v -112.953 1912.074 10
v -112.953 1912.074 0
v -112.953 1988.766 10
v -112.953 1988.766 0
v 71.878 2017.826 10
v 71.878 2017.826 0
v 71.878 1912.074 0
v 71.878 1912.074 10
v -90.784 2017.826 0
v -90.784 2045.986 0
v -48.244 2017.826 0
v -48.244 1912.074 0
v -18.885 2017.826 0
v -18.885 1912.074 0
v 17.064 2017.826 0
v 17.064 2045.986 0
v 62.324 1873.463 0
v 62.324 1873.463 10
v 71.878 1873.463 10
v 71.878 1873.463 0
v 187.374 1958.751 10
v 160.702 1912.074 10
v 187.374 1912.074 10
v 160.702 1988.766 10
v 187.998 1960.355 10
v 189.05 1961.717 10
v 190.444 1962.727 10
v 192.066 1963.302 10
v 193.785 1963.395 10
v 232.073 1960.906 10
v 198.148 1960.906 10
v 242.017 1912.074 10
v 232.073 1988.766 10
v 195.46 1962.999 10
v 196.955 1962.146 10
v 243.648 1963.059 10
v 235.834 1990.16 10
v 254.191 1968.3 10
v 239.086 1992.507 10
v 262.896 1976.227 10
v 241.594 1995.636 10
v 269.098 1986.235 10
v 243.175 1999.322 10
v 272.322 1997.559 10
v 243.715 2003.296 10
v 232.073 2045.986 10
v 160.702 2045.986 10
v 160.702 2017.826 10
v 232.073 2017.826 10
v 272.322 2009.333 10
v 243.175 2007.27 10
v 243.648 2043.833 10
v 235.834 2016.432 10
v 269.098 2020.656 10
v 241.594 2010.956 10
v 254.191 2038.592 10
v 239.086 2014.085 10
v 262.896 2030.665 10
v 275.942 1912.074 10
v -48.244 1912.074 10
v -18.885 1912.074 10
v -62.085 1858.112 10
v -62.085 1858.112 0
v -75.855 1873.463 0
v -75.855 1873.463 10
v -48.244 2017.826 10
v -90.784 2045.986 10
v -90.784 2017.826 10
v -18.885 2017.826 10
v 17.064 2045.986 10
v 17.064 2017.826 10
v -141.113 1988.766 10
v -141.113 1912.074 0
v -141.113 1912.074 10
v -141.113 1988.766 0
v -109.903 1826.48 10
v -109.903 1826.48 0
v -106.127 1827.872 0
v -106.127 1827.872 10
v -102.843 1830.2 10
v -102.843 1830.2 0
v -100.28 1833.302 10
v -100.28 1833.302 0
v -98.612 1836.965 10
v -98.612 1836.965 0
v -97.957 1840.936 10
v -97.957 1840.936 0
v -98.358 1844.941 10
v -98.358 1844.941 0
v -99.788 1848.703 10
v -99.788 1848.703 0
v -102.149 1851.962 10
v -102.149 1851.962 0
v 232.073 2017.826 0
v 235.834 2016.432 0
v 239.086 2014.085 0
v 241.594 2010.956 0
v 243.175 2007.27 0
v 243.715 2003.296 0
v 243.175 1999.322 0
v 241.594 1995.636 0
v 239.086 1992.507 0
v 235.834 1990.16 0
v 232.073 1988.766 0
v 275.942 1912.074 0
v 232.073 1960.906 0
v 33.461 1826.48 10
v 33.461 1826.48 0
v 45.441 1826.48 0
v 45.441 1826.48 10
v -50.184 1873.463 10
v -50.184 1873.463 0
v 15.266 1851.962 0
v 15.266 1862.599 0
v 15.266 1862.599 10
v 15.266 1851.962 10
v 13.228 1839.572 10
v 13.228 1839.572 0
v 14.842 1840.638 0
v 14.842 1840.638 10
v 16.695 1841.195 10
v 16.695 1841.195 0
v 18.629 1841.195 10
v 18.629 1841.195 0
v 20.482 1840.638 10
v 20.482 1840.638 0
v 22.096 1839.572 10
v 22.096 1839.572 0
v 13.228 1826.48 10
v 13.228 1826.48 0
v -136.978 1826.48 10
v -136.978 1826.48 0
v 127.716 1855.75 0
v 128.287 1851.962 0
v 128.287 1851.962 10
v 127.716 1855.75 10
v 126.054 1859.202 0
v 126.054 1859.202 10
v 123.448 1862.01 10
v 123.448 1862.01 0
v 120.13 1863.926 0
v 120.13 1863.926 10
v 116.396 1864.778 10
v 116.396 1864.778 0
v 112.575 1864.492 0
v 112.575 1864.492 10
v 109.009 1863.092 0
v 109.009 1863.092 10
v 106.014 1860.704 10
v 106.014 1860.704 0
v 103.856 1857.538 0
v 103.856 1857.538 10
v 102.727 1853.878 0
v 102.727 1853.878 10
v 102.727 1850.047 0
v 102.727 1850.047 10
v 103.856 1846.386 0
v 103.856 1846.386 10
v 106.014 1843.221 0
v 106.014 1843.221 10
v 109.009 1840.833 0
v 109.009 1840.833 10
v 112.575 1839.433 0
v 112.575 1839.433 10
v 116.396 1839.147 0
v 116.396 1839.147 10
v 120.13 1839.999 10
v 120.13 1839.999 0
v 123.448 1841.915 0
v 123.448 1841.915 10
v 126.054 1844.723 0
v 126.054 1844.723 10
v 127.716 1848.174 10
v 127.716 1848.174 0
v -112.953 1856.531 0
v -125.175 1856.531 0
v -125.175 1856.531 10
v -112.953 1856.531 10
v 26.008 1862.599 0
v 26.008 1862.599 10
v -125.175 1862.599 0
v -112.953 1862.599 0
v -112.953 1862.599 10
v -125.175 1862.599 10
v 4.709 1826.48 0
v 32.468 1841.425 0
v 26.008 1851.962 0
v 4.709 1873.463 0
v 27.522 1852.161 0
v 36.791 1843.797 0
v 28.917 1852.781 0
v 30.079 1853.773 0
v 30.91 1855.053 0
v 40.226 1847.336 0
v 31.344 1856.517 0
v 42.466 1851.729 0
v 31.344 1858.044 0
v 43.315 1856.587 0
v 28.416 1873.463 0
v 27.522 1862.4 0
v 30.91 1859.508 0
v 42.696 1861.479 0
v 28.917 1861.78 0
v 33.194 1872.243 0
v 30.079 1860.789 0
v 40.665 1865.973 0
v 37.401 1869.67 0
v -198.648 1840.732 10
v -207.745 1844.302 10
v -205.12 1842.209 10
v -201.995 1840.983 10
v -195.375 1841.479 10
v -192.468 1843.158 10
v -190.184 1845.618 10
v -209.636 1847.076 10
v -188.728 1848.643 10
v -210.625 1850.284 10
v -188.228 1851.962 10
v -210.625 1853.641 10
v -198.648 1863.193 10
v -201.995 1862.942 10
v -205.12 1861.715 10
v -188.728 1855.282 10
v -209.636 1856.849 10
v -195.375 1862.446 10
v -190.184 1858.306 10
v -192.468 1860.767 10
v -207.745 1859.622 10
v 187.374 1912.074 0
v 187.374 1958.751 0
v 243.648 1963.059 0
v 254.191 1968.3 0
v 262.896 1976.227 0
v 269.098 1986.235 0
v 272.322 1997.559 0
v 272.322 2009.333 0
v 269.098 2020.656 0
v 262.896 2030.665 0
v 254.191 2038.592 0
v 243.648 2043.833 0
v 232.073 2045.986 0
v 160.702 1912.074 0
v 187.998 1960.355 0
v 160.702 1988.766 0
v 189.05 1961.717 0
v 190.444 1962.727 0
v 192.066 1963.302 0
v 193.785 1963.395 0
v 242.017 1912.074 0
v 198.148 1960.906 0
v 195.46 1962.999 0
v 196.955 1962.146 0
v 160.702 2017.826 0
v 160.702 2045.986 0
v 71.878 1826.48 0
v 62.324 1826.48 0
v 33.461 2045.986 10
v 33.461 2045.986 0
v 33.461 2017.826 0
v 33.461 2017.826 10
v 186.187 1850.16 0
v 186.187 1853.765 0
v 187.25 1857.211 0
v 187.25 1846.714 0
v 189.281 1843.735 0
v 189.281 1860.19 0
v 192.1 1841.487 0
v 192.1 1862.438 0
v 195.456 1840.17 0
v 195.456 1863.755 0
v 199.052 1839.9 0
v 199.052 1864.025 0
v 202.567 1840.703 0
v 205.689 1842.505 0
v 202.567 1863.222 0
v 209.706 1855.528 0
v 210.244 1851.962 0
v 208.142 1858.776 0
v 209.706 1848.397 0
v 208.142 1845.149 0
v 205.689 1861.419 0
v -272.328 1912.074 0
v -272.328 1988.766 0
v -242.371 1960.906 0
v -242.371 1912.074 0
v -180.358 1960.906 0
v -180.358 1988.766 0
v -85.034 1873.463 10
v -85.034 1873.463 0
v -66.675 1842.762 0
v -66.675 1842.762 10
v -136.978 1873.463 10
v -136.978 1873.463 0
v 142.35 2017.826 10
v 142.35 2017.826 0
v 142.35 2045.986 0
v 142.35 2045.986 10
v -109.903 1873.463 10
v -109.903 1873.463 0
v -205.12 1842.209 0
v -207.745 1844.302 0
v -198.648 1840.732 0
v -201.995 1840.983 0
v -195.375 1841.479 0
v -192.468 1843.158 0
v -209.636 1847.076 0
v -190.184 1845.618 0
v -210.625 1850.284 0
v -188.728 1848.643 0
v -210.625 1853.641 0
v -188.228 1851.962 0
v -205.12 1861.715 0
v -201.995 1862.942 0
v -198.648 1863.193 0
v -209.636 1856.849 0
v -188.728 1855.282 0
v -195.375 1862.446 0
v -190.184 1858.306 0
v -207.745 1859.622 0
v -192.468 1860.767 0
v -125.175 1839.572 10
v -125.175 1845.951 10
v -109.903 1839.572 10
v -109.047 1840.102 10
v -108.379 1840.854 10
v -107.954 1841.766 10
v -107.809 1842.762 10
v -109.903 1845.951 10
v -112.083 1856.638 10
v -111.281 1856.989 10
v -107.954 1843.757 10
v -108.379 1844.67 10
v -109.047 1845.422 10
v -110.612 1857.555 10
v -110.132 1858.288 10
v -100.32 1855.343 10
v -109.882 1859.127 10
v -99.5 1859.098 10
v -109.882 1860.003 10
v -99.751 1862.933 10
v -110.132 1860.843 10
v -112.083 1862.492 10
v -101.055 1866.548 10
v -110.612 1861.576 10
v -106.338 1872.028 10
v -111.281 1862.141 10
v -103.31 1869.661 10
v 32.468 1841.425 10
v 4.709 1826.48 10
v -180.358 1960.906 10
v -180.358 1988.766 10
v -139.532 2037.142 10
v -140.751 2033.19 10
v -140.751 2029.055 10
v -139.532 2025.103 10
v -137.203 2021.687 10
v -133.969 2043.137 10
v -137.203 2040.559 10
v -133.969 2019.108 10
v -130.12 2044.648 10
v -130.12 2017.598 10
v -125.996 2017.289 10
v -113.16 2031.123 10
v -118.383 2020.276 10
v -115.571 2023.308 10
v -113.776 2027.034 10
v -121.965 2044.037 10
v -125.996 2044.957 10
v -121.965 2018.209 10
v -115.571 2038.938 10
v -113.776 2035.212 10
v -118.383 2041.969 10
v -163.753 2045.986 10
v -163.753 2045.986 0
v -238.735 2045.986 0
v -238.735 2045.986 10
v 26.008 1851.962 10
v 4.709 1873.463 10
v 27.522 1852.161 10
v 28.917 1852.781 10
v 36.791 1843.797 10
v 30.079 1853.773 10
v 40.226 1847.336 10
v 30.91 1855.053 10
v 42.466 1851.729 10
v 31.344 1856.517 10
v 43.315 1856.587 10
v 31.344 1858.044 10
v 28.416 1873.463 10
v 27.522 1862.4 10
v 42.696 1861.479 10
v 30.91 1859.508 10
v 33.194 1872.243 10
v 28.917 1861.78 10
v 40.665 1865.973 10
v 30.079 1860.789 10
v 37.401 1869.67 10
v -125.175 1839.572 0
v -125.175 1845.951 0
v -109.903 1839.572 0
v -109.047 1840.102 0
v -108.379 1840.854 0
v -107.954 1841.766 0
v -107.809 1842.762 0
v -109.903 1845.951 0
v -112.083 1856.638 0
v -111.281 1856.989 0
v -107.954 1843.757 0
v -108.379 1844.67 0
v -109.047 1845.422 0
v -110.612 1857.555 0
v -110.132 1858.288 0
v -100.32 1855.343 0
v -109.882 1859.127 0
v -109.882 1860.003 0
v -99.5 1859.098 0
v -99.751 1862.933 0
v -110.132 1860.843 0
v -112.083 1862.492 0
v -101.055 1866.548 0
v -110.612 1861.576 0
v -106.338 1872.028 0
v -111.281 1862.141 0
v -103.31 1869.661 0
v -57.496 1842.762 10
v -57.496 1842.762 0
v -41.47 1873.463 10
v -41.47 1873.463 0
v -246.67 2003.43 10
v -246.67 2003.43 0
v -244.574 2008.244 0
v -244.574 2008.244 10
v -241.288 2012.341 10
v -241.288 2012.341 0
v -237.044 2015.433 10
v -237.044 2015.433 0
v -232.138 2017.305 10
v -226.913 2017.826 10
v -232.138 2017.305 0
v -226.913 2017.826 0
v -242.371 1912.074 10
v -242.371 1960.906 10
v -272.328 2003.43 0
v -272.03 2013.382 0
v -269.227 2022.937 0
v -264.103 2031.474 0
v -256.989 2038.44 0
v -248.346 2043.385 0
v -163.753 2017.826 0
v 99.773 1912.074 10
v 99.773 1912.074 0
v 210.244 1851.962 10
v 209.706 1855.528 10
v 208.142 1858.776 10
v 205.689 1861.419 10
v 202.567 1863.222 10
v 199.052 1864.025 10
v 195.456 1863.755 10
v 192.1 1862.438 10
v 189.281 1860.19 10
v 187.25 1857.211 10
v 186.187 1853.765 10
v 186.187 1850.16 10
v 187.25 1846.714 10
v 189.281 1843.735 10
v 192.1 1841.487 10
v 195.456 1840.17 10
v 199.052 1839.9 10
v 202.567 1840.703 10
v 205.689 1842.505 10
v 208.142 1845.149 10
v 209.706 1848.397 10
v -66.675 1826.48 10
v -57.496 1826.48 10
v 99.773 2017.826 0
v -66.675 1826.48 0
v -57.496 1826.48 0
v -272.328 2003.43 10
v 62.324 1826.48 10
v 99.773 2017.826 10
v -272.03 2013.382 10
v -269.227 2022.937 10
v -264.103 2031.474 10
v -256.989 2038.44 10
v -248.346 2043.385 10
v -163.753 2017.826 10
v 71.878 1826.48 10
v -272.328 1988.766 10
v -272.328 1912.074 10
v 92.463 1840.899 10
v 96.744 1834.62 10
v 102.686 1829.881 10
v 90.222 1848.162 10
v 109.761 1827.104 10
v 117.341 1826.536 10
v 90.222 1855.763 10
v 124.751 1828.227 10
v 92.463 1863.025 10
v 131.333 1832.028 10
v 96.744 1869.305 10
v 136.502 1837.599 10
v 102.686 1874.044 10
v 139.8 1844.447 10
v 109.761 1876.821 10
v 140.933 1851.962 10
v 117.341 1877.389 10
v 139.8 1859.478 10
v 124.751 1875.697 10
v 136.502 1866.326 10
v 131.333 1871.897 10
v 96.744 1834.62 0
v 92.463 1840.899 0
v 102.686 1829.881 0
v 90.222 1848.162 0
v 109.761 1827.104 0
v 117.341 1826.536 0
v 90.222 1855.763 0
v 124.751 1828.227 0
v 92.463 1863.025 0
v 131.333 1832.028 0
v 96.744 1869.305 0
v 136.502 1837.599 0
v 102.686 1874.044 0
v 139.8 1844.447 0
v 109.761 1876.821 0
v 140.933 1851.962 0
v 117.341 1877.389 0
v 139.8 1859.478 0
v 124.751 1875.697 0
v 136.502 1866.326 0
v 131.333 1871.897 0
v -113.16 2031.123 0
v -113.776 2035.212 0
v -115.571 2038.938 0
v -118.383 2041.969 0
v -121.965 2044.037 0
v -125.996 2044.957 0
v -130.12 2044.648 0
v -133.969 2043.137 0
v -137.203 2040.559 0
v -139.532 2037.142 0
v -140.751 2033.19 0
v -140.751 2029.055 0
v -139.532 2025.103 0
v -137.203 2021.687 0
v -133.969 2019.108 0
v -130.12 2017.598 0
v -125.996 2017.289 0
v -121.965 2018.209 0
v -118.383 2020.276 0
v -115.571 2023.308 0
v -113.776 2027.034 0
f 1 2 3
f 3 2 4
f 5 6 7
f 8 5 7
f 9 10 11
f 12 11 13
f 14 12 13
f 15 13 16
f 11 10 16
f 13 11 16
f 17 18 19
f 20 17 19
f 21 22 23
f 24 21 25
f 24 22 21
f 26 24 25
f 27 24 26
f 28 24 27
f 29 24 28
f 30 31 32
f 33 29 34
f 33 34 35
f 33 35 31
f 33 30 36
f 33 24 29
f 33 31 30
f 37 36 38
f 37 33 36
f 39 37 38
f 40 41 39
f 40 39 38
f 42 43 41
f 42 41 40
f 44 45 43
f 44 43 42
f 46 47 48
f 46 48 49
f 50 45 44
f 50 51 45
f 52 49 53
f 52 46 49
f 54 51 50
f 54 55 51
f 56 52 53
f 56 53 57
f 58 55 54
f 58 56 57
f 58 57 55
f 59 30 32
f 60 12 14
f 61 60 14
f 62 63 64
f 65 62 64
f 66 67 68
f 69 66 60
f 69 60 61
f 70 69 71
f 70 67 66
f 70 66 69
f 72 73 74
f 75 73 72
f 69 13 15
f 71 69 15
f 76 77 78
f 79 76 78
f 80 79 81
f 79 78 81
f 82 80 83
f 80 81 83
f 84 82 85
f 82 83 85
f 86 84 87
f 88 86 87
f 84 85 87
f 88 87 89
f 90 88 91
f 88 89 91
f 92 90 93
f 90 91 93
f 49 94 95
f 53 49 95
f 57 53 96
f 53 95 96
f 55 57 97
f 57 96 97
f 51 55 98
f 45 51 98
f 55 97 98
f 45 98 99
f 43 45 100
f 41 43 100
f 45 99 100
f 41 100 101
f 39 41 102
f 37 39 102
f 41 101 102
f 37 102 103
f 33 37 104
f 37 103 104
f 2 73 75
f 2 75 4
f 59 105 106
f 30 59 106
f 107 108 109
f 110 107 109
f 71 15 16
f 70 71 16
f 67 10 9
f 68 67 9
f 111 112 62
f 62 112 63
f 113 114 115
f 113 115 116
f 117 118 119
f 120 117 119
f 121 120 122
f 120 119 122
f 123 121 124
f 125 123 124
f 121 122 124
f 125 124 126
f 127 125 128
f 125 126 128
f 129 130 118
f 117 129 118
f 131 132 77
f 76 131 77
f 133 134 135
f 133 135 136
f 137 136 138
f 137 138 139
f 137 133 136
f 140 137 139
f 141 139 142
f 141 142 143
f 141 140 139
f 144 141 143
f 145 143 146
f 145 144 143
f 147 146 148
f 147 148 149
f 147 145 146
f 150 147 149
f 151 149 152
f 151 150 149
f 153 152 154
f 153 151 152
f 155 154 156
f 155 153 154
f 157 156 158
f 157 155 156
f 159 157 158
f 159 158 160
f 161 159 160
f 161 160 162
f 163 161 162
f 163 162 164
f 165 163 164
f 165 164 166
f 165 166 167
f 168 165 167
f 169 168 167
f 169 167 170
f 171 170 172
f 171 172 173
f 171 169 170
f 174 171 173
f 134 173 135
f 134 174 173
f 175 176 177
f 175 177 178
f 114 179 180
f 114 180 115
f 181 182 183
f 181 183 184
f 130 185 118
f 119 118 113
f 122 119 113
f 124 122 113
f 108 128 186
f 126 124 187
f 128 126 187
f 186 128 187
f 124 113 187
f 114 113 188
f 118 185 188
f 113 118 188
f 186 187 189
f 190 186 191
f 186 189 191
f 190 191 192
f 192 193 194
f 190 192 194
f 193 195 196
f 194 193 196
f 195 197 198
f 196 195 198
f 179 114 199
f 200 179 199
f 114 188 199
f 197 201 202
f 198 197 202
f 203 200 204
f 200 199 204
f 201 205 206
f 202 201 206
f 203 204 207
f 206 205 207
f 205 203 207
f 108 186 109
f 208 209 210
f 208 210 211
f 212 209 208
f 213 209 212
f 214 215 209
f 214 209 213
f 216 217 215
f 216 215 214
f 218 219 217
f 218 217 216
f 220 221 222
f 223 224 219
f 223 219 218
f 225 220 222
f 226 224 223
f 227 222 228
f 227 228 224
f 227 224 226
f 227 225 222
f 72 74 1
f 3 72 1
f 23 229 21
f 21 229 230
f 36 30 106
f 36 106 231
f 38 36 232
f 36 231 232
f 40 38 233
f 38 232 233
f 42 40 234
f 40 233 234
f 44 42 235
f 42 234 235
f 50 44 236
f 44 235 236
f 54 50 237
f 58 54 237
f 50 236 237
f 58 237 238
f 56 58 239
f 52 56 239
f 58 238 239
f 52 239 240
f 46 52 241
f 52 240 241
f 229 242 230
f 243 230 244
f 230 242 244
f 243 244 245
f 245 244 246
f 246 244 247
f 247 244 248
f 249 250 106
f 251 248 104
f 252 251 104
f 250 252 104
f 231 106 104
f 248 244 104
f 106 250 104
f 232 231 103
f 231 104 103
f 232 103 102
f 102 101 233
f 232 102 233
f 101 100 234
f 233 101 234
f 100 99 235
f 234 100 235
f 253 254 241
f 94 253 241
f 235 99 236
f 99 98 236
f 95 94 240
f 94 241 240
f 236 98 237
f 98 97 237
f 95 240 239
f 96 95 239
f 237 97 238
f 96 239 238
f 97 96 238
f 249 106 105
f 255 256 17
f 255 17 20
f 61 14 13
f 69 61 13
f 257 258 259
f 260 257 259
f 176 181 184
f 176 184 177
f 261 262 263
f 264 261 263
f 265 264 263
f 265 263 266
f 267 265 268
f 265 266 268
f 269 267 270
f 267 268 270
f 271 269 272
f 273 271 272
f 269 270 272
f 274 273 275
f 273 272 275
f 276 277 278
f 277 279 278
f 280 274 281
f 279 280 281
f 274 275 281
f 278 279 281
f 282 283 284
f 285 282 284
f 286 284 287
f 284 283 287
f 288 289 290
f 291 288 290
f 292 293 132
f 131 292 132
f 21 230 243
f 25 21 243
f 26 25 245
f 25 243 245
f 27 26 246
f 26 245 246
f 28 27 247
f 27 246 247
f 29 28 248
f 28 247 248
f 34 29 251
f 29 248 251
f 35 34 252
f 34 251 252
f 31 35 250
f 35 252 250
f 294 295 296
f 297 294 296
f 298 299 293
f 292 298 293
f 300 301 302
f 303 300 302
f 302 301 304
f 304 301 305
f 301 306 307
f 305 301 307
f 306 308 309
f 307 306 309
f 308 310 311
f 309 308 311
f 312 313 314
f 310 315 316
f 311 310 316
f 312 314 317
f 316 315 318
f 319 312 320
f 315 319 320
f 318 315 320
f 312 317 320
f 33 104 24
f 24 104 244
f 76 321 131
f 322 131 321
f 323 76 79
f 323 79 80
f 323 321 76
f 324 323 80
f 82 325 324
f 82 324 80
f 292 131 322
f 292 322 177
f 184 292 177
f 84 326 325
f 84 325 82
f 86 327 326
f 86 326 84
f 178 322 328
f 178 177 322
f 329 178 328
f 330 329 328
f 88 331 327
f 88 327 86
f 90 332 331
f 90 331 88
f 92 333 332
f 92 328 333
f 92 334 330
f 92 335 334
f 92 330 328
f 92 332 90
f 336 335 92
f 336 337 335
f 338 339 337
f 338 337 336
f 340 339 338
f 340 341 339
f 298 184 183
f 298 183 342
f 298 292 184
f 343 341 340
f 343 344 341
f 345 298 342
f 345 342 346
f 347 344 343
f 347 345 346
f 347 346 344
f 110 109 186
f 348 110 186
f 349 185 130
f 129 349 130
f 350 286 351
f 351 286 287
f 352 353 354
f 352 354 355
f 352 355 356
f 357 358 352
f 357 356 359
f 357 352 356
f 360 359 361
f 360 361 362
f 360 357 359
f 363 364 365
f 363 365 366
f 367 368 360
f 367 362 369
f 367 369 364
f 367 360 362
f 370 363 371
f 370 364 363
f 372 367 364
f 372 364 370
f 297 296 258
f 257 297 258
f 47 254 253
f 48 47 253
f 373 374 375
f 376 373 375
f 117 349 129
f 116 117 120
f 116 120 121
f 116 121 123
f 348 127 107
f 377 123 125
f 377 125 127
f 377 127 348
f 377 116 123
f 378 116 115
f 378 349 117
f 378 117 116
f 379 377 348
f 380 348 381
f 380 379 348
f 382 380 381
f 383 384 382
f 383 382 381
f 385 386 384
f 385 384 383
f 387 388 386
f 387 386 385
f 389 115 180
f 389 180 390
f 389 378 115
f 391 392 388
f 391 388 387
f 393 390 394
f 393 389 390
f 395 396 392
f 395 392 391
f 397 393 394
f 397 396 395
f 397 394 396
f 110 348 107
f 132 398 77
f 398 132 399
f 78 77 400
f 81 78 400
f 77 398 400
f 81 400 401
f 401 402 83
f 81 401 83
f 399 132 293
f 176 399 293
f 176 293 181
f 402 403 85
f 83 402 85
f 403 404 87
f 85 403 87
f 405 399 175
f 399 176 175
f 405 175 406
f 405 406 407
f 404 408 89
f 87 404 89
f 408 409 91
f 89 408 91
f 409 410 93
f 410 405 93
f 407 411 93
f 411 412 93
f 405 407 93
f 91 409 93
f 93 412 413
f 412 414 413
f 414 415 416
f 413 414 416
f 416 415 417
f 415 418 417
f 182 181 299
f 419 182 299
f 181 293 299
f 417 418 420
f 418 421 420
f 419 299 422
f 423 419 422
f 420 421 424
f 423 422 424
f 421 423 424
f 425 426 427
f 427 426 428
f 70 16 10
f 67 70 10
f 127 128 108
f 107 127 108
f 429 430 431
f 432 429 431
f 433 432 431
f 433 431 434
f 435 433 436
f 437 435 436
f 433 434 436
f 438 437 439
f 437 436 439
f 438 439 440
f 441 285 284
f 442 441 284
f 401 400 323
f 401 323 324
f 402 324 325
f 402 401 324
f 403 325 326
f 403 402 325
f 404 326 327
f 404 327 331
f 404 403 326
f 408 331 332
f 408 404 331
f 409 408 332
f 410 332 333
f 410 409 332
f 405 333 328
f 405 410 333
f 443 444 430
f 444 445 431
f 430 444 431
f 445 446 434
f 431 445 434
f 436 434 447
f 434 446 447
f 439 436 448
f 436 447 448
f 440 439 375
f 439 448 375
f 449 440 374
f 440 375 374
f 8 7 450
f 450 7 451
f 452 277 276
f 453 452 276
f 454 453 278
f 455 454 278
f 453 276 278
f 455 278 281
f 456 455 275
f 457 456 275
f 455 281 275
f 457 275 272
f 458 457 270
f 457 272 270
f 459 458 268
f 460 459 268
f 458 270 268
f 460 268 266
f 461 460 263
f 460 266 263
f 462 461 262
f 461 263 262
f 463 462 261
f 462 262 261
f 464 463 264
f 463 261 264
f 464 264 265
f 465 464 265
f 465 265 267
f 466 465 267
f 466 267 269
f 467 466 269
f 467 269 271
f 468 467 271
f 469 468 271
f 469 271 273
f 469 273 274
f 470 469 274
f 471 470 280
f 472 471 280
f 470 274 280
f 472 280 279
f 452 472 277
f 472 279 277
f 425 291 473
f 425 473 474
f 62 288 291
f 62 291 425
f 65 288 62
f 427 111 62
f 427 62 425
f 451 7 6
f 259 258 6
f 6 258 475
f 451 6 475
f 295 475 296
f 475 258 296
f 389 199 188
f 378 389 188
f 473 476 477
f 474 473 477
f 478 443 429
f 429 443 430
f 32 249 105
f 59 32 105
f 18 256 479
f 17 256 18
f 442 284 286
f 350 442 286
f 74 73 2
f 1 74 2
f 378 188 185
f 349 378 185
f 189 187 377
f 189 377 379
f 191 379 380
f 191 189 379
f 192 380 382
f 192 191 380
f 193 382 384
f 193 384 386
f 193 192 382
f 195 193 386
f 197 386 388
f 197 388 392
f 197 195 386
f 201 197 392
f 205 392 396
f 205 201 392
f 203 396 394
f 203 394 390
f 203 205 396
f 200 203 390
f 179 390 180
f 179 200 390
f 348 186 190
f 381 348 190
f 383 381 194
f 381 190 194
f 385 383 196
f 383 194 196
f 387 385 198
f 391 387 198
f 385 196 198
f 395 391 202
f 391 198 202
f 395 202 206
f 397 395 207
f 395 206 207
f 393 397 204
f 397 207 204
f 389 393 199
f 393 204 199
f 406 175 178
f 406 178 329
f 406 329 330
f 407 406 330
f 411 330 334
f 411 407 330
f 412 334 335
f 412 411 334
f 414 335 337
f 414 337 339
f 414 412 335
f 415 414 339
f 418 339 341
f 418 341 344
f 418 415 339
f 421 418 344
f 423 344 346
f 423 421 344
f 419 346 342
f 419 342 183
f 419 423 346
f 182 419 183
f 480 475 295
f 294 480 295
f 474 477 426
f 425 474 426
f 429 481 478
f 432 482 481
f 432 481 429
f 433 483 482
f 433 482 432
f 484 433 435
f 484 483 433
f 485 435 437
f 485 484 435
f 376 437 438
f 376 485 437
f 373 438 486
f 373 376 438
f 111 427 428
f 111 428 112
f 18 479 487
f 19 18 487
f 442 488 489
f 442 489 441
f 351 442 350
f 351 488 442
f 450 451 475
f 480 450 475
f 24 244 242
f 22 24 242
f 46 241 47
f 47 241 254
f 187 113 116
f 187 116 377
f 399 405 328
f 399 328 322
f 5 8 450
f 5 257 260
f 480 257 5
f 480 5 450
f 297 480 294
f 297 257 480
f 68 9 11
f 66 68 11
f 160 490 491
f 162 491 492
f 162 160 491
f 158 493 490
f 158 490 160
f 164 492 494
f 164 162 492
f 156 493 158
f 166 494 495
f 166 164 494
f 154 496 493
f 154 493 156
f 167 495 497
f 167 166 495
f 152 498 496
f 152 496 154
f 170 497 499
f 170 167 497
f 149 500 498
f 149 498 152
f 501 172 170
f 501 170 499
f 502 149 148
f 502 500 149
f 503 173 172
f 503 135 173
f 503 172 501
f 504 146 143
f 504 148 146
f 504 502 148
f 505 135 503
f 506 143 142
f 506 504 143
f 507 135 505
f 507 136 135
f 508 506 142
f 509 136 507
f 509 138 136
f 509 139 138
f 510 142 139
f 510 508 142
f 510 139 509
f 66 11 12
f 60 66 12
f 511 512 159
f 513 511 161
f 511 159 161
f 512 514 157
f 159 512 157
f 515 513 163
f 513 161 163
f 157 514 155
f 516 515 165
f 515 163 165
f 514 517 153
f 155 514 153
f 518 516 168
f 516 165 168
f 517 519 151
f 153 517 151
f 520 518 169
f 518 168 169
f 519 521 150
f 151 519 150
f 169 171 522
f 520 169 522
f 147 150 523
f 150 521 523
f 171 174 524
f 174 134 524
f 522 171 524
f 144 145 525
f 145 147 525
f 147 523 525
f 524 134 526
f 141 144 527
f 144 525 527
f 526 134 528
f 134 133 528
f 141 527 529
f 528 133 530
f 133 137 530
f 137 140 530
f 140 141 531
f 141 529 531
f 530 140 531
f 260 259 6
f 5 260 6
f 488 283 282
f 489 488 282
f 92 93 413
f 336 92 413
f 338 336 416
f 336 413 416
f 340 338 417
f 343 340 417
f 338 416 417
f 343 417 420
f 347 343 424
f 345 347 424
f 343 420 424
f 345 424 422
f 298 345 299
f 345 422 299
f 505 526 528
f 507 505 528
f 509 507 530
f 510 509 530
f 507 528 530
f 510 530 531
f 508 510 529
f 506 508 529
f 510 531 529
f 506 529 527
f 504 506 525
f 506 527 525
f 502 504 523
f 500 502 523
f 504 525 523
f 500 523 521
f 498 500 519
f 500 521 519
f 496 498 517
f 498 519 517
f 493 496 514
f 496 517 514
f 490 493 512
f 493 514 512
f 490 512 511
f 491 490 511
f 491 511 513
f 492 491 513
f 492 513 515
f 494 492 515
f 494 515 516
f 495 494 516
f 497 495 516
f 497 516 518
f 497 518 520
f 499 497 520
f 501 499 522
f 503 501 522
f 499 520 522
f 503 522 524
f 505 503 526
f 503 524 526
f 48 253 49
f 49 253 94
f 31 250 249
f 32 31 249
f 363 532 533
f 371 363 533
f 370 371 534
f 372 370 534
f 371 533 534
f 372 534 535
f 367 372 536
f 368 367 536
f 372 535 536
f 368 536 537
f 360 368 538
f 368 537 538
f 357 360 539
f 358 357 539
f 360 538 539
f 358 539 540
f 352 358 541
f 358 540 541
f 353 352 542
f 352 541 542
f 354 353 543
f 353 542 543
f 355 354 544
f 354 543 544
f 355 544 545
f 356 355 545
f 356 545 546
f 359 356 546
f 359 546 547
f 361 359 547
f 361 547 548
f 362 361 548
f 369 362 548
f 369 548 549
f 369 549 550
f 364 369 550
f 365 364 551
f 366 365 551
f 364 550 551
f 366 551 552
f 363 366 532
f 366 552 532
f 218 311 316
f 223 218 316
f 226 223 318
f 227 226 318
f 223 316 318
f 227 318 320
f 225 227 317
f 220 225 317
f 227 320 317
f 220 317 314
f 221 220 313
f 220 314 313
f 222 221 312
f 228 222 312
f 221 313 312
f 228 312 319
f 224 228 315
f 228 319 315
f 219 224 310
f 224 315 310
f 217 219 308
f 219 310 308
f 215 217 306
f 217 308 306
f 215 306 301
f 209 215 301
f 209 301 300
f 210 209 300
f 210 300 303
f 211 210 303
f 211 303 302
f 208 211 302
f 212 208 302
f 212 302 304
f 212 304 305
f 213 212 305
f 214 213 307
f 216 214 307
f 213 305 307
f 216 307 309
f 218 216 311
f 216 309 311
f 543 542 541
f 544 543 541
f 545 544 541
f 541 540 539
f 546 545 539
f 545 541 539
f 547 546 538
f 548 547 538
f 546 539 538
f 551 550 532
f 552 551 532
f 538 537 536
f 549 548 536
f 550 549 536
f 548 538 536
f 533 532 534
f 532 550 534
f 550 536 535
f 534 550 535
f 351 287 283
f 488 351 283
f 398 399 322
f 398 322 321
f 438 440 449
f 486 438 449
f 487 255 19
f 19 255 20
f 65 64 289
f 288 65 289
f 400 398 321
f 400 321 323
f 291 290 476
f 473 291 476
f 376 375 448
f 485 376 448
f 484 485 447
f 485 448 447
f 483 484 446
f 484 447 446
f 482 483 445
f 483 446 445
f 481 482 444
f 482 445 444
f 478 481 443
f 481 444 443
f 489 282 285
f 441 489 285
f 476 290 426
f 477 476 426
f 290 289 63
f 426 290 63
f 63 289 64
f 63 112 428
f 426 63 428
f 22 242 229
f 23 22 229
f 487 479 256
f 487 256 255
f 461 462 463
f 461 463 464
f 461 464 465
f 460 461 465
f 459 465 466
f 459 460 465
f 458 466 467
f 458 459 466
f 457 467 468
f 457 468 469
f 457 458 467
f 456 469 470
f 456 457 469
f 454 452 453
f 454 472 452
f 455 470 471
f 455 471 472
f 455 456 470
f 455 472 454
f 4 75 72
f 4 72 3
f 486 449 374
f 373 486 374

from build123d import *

# Parameters (mm, degrees)
SKETCH1_R              = 13.872950016
BOSS_EXTRUDE1_DEPTH    = 10
SKETCH1_R_2            = 11.261714239
BOSS_EXTRUDE1_2_DEPTH  = 10
SKETCH1_R_3            = 12.095962235
BOSS_EXTRUDE1_3_DEPTH  = 10
SKETCH1_R_4            = 25.497629654
SKETCH1_R_5            = 12.851526445
BOSS_EXTRUDE1_4_DEPTH  = 10
BOSS_EXTRUDE1_5_DEPTH  = 10
SKETCH1_W              = 28.160353525
SKETCH1_H              = 76.692026621
BOSS_EXTRUDE1_6_DEPTH  = 10
BOSS_EXTRUDE1_7_DEPTH  = 10
BOSS_EXTRUDE1_8_DEPTH  = 10
BOSS_EXTRUDE1_9_DEPTH  = 10
BOSS_EXTRUDE1_10_DEPTH = 10
BOSS_EXTRUDE1_11_DEPTH = 10
BOSS_EXTRUDE1_12_DEPTH = 10
BOSS_EXTRUDE1_13_DEPTH = 10
SKETCH1_W_2            = 9.553902
SKETCH1_H_2            = 46.983083585
BOSS_EXTRUDE1_14_DEPTH = 10


with BuildPart() as part:
    # Sketch1 → Boss-Extrude1 (new body)
    with BuildSketch(Plane.XY):
        with Locations((-127.032963832, 2031.122733015)):
            Circle(SKETCH1_R)
    extrude(amount=BOSS_EXTRUDE1_DEPTH)


with BuildPart() as body_2:
    # Sketch1 → Boss-Extrude1 2 (new body)
    with BuildSketch(Plane.XY):
        with Locations((-199.489316183, 1851.962400951)):
            Circle(SKETCH1_R_2)
    extrude(amount=BOSS_EXTRUDE1_2_DEPTH)


with BuildPart() as body_3:
    # Sketch1 → Boss-Extrude1 3 (new body)
    with BuildSketch(Plane.XY):
        with Locations((198.147588845, 1851.962400951)):
            Circle(SKETCH1_R_3)
    extrude(amount=BOSS_EXTRUDE1_3_DEPTH)


with BuildPart() as body_4:
    # Sketch1 → Boss-Extrude1 4 (new body)
    with BuildSketch(Plane.XY):
        with Locations((115.435182788, 1851.962400951)):
            Circle(SKETCH1_R_4)
        with Locations((115.435182788, 1851.962400951)):
            Circle(SKETCH1_R_5, mode=Mode.SUBTRACT)
    extrude(amount=BOSS_EXTRUDE1_4_DEPTH)


with BuildPart() as body_5:
    # Sketch1 → Boss-Extrude1 5 (new body)
    with BuildSketch(Plane.XY):
        Polygon((-272.328404892, 1988.766458193), (-272.328404892, 1912.074431572), (-242.370581993, 1912.074431572), (-242.370581993, 1960.905682897), (-180.357888592, 1960.905682897), (-180.357888592, 1988.766458193), align=None)
    extrude(amount=BOSS_EXTRUDE1_5_DEPTH)


with BuildPart() as body_6:
    # Sketch1 → Boss-Extrude1 6 (new body)
    with BuildSketch(Plane.XY):
        with Locations((-127.032963833, 1950.420444883)):
            Rectangle(SKETCH1_W, SKETCH1_H)
    extrude(amount=BOSS_EXTRUDE1_6_DEPTH)


with BuildPart() as body_7:
    # Sketch1 → Boss-Extrude1 7 (new body)
    with BuildSketch(Plane.XY):
        Polygon((-48.243889609, 2017.825546405), (-48.243889609, 1912.074431572), (-18.885223168, 1912.074431572), (-18.885223168, 2017.825546405), (17.064164311, 2017.825546405), (17.064164311, 2045.98589993), (-90.783998125, 2045.98589993), (-90.783998125, 2017.825546405), align=None)
    extrude(amount=BOSS_EXTRUDE1_7_DEPTH)


with BuildPart() as body_8:
    # Sketch1 → Boss-Extrude1 8 (new body)
    with BuildSketch(Plane.XY):
        Polygon((71.877747221, 2017.825546405), (71.877747221, 1912.074431572), (99.773015751, 1912.074431572), (99.773015751, 2017.825546405), (142.350004559, 2017.825546405), (142.350004559, 2045.98589993), (33.460579157, 2045.98589993), (33.460579157, 2017.825546405), align=None)
    extrude(amount=BOSS_EXTRUDE1_8_DEPTH)


with BuildPart() as body_9:
    # Sketch1 → Boss-Extrude1 9 (new body)
    with BuildSketch(Plane.XY):
        with BuildLine():
            Line((160.702154908, 1988.766458193), (160.702154908, 1912.074431572))
            Line((160.702154908, 1912.074431572), (187.373946748, 1912.074431572))
            Line((187.373946748, 1912.074431572), (187.373946748, 1958.750849803))
            ThreePointArc((187.373946748, 1958.750849803), (192.06601131, 1963.30188004), (198.147588845, 1960.905682897))
            Line((198.147588845, 1960.905682897), (242.016569038, 1912.074431572))
            Line((242.016569038, 1912.074431572), (275.941913721, 1912.074431572))
            Line((275.941913721, 1912.074431572), (232.072933528, 1960.905682897))
            ThreePointArc((232.072933528, 1960.905682897), (272.730878669, 2003.445791413), (232.072933528, 2045.98589993))
            Line((232.072933528, 2045.98589993), (160.702154908, 2045.98589993))
            Line((160.702154908, 2045.98589993), (160.702154908, 2017.825546405))
            Line((160.702154908, 2017.825546405), (232.072933528, 2017.825546405))
            ThreePointArc((232.072933528, 2017.825546405), (243.71530311, 2003.296002299), (232.072933528, 1988.766458193))
            Line((232.072933528, 1988.766458193), (160.702154908, 1988.766458193))
        make_face()
    extrude(amount=BOSS_EXTRUDE1_9_DEPTH)


with BuildPart() as body_10:
    # Sketch1 → Boss-Extrude1 10 (new body)
    with BuildSketch(Plane.XY):
        with BuildLine():
            Line((-272.328404892, 2003.429645733), (-246.670286028, 2003.429645733))
            ThreePointArc((-246.670286028, 2003.429645733), (-239.268889638, 2014.02773476), (-226.91264481, 2017.825546405))
            Line((-226.91264481, 2017.825546405), (-163.75297206, 2017.825546405))
            Line((-163.75297206, 2017.825546405), (-163.75297206, 2045.98589993))
            Line((-163.75297206, 2045.98589993), (-226.912644809, 2045.98589993))
            Line((-226.912644809, 2045.98589993), (-238.734839965, 2045.98589993))
            ThreePointArc((-238.734839965, 2045.98589993), (-264.103032071, 2031.473974692), (-272.328404892, 2003.429645733))
        make_face()
    extrude(amount=BOSS_EXTRUDE1_10_DEPTH)


with BuildPart() as body_11:
    # Sketch1 → Boss-Extrude1 11 (new body)
    with BuildSketch(Plane.XY):
        with BuildLine():
            Line((-136.977925312, 1873.463134117), (-136.977925312, 1826.480050532))
            Line((-136.977925312, 1826.480050532), (-109.902927992, 1826.480050532))
            ThreePointArc((-109.902927992, 1826.480050532), (-98.612469798, 1836.965351507), (-102.148638735, 1851.962400951))
            ThreePointArc((-102.148638735, 1851.962400951), (-100.276299584, 1864.786332187), (-109.902927992, 1873.463134117))
            Line((-109.902927992, 1873.463134117), (-136.977925312, 1873.463134117))
        make_face()
        with BuildLine():
            Line((-125.175267733, 1862.598979878), (-125.175267733, 1856.531151967))
            Line((-125.175267733, 1856.531151967), (-112.95278707, 1856.531151967))
            ThreePointArc((-112.95278707, 1856.531151967), (-109.850175983, 1859.565065922), (-112.95278707, 1862.598979878))
            Line((-112.95278707, 1862.598979878), (-125.175267733, 1862.598979878))
        make_face(mode=Mode.SUBTRACT)
        with BuildLine():
            Line((-125.175267733, 1845.951349454), (-125.175267733, 1839.57235088))
            Line((-125.175267733, 1839.57235088), (-112.95278707, 1839.57235088))
            Line((-112.95278707, 1839.57235088), (-109.902927992, 1839.57235088))
            ThreePointArc((-109.902927992, 1839.57235088), (-107.808637054, 1842.761850167), (-109.902927992, 1845.951349454))
            Line((-109.902927992, 1845.951349454), (-112.95278707, 1845.951349454))
            Line((-112.95278707, 1845.951349454), (-125.175267733, 1845.951349454))
        make_face(mode=Mode.SUBTRACT)
    extrude(amount=BOSS_EXTRUDE1_11_DEPTH)


with BuildPart() as body_12:
    # Sketch1 → Boss-Extrude1 12 (new body)
    with BuildSketch(Plane.XY):
        Polygon((-85.034252317, 1873.463134117), (-66.675183251, 1842.761850167), (-66.675183251, 1826.480050532), (-57.495648718, 1826.480050532), (-57.495648718, 1842.761850167), (-41.470359618, 1873.463134117), (-50.184330229, 1873.463134117), (-62.085415985, 1858.112492142), (-75.854717784, 1873.463134117), align=None)
    extrude(amount=BOSS_EXTRUDE1_12_DEPTH)


with BuildPart() as body_13:
    # Sketch1 → Boss-Extrude1 13 (new body)
    with BuildSketch(Plane.XY):
        with BuildLine():
            Line((4.708619391, 1873.463134117), (4.708619391, 1826.480050532))
            Line((4.708619391, 1826.480050532), (13.228360596, 1826.480050532))
            Line((13.228360596, 1826.480050532), (13.228360596, 1839.57235088))
            ThreePointArc((13.228360596, 1839.57235088), (17.6621462, 1841.265735094), (22.095931804, 1839.57235088))
            Line((22.095931804, 1839.57235088), (33.460579157, 1826.480050532))
            Line((33.460579157, 1826.480050532), (45.440627673, 1826.480050532))
            Line((45.440627673, 1826.480050532), (32.467727531, 1841.425090159))
            ThreePointArc((32.467727531, 1841.425090159), (43.188436735, 1859.056248569), (28.415725354, 1873.463134117))
            Line((28.415725354, 1873.463134117), (4.708619391, 1873.463134117))
        make_face()
        with BuildLine():
            Line((15.265690015, 1862.598979878), (15.265690015, 1851.962400951))
            Line((15.265690015, 1851.962400951), (26.007972405, 1851.962400951))
            ThreePointArc((26.007972405, 1851.962400951), (31.399297294, 1857.280690415), (26.007972405, 1862.598979878))
            Line((26.007972405, 1862.598979878), (15.265690015, 1862.598979878))
        make_face(mode=Mode.SUBTRACT)
    extrude(amount=BOSS_EXTRUDE1_13_DEPTH)


with BuildPart() as body_14:
    # Sketch1 → Boss-Extrude1 14 (new body)
    with BuildSketch(Plane.XY):
        with Locations((67.100796221, 1849.971592325)):
            Rectangle(SKETCH1_W_2, SKETCH1_H_2)
    extrude(amount=BOSS_EXTRUDE1_14_DEPTH)


solid = Compound([part.part, body_2.part, body_3.part, body_4.part, body_5.part, body_6.part, body_7.part, body_8.part, body_9.part, body_10.part, body_11.part, body_12.part, body_13.part, body_14.part])
